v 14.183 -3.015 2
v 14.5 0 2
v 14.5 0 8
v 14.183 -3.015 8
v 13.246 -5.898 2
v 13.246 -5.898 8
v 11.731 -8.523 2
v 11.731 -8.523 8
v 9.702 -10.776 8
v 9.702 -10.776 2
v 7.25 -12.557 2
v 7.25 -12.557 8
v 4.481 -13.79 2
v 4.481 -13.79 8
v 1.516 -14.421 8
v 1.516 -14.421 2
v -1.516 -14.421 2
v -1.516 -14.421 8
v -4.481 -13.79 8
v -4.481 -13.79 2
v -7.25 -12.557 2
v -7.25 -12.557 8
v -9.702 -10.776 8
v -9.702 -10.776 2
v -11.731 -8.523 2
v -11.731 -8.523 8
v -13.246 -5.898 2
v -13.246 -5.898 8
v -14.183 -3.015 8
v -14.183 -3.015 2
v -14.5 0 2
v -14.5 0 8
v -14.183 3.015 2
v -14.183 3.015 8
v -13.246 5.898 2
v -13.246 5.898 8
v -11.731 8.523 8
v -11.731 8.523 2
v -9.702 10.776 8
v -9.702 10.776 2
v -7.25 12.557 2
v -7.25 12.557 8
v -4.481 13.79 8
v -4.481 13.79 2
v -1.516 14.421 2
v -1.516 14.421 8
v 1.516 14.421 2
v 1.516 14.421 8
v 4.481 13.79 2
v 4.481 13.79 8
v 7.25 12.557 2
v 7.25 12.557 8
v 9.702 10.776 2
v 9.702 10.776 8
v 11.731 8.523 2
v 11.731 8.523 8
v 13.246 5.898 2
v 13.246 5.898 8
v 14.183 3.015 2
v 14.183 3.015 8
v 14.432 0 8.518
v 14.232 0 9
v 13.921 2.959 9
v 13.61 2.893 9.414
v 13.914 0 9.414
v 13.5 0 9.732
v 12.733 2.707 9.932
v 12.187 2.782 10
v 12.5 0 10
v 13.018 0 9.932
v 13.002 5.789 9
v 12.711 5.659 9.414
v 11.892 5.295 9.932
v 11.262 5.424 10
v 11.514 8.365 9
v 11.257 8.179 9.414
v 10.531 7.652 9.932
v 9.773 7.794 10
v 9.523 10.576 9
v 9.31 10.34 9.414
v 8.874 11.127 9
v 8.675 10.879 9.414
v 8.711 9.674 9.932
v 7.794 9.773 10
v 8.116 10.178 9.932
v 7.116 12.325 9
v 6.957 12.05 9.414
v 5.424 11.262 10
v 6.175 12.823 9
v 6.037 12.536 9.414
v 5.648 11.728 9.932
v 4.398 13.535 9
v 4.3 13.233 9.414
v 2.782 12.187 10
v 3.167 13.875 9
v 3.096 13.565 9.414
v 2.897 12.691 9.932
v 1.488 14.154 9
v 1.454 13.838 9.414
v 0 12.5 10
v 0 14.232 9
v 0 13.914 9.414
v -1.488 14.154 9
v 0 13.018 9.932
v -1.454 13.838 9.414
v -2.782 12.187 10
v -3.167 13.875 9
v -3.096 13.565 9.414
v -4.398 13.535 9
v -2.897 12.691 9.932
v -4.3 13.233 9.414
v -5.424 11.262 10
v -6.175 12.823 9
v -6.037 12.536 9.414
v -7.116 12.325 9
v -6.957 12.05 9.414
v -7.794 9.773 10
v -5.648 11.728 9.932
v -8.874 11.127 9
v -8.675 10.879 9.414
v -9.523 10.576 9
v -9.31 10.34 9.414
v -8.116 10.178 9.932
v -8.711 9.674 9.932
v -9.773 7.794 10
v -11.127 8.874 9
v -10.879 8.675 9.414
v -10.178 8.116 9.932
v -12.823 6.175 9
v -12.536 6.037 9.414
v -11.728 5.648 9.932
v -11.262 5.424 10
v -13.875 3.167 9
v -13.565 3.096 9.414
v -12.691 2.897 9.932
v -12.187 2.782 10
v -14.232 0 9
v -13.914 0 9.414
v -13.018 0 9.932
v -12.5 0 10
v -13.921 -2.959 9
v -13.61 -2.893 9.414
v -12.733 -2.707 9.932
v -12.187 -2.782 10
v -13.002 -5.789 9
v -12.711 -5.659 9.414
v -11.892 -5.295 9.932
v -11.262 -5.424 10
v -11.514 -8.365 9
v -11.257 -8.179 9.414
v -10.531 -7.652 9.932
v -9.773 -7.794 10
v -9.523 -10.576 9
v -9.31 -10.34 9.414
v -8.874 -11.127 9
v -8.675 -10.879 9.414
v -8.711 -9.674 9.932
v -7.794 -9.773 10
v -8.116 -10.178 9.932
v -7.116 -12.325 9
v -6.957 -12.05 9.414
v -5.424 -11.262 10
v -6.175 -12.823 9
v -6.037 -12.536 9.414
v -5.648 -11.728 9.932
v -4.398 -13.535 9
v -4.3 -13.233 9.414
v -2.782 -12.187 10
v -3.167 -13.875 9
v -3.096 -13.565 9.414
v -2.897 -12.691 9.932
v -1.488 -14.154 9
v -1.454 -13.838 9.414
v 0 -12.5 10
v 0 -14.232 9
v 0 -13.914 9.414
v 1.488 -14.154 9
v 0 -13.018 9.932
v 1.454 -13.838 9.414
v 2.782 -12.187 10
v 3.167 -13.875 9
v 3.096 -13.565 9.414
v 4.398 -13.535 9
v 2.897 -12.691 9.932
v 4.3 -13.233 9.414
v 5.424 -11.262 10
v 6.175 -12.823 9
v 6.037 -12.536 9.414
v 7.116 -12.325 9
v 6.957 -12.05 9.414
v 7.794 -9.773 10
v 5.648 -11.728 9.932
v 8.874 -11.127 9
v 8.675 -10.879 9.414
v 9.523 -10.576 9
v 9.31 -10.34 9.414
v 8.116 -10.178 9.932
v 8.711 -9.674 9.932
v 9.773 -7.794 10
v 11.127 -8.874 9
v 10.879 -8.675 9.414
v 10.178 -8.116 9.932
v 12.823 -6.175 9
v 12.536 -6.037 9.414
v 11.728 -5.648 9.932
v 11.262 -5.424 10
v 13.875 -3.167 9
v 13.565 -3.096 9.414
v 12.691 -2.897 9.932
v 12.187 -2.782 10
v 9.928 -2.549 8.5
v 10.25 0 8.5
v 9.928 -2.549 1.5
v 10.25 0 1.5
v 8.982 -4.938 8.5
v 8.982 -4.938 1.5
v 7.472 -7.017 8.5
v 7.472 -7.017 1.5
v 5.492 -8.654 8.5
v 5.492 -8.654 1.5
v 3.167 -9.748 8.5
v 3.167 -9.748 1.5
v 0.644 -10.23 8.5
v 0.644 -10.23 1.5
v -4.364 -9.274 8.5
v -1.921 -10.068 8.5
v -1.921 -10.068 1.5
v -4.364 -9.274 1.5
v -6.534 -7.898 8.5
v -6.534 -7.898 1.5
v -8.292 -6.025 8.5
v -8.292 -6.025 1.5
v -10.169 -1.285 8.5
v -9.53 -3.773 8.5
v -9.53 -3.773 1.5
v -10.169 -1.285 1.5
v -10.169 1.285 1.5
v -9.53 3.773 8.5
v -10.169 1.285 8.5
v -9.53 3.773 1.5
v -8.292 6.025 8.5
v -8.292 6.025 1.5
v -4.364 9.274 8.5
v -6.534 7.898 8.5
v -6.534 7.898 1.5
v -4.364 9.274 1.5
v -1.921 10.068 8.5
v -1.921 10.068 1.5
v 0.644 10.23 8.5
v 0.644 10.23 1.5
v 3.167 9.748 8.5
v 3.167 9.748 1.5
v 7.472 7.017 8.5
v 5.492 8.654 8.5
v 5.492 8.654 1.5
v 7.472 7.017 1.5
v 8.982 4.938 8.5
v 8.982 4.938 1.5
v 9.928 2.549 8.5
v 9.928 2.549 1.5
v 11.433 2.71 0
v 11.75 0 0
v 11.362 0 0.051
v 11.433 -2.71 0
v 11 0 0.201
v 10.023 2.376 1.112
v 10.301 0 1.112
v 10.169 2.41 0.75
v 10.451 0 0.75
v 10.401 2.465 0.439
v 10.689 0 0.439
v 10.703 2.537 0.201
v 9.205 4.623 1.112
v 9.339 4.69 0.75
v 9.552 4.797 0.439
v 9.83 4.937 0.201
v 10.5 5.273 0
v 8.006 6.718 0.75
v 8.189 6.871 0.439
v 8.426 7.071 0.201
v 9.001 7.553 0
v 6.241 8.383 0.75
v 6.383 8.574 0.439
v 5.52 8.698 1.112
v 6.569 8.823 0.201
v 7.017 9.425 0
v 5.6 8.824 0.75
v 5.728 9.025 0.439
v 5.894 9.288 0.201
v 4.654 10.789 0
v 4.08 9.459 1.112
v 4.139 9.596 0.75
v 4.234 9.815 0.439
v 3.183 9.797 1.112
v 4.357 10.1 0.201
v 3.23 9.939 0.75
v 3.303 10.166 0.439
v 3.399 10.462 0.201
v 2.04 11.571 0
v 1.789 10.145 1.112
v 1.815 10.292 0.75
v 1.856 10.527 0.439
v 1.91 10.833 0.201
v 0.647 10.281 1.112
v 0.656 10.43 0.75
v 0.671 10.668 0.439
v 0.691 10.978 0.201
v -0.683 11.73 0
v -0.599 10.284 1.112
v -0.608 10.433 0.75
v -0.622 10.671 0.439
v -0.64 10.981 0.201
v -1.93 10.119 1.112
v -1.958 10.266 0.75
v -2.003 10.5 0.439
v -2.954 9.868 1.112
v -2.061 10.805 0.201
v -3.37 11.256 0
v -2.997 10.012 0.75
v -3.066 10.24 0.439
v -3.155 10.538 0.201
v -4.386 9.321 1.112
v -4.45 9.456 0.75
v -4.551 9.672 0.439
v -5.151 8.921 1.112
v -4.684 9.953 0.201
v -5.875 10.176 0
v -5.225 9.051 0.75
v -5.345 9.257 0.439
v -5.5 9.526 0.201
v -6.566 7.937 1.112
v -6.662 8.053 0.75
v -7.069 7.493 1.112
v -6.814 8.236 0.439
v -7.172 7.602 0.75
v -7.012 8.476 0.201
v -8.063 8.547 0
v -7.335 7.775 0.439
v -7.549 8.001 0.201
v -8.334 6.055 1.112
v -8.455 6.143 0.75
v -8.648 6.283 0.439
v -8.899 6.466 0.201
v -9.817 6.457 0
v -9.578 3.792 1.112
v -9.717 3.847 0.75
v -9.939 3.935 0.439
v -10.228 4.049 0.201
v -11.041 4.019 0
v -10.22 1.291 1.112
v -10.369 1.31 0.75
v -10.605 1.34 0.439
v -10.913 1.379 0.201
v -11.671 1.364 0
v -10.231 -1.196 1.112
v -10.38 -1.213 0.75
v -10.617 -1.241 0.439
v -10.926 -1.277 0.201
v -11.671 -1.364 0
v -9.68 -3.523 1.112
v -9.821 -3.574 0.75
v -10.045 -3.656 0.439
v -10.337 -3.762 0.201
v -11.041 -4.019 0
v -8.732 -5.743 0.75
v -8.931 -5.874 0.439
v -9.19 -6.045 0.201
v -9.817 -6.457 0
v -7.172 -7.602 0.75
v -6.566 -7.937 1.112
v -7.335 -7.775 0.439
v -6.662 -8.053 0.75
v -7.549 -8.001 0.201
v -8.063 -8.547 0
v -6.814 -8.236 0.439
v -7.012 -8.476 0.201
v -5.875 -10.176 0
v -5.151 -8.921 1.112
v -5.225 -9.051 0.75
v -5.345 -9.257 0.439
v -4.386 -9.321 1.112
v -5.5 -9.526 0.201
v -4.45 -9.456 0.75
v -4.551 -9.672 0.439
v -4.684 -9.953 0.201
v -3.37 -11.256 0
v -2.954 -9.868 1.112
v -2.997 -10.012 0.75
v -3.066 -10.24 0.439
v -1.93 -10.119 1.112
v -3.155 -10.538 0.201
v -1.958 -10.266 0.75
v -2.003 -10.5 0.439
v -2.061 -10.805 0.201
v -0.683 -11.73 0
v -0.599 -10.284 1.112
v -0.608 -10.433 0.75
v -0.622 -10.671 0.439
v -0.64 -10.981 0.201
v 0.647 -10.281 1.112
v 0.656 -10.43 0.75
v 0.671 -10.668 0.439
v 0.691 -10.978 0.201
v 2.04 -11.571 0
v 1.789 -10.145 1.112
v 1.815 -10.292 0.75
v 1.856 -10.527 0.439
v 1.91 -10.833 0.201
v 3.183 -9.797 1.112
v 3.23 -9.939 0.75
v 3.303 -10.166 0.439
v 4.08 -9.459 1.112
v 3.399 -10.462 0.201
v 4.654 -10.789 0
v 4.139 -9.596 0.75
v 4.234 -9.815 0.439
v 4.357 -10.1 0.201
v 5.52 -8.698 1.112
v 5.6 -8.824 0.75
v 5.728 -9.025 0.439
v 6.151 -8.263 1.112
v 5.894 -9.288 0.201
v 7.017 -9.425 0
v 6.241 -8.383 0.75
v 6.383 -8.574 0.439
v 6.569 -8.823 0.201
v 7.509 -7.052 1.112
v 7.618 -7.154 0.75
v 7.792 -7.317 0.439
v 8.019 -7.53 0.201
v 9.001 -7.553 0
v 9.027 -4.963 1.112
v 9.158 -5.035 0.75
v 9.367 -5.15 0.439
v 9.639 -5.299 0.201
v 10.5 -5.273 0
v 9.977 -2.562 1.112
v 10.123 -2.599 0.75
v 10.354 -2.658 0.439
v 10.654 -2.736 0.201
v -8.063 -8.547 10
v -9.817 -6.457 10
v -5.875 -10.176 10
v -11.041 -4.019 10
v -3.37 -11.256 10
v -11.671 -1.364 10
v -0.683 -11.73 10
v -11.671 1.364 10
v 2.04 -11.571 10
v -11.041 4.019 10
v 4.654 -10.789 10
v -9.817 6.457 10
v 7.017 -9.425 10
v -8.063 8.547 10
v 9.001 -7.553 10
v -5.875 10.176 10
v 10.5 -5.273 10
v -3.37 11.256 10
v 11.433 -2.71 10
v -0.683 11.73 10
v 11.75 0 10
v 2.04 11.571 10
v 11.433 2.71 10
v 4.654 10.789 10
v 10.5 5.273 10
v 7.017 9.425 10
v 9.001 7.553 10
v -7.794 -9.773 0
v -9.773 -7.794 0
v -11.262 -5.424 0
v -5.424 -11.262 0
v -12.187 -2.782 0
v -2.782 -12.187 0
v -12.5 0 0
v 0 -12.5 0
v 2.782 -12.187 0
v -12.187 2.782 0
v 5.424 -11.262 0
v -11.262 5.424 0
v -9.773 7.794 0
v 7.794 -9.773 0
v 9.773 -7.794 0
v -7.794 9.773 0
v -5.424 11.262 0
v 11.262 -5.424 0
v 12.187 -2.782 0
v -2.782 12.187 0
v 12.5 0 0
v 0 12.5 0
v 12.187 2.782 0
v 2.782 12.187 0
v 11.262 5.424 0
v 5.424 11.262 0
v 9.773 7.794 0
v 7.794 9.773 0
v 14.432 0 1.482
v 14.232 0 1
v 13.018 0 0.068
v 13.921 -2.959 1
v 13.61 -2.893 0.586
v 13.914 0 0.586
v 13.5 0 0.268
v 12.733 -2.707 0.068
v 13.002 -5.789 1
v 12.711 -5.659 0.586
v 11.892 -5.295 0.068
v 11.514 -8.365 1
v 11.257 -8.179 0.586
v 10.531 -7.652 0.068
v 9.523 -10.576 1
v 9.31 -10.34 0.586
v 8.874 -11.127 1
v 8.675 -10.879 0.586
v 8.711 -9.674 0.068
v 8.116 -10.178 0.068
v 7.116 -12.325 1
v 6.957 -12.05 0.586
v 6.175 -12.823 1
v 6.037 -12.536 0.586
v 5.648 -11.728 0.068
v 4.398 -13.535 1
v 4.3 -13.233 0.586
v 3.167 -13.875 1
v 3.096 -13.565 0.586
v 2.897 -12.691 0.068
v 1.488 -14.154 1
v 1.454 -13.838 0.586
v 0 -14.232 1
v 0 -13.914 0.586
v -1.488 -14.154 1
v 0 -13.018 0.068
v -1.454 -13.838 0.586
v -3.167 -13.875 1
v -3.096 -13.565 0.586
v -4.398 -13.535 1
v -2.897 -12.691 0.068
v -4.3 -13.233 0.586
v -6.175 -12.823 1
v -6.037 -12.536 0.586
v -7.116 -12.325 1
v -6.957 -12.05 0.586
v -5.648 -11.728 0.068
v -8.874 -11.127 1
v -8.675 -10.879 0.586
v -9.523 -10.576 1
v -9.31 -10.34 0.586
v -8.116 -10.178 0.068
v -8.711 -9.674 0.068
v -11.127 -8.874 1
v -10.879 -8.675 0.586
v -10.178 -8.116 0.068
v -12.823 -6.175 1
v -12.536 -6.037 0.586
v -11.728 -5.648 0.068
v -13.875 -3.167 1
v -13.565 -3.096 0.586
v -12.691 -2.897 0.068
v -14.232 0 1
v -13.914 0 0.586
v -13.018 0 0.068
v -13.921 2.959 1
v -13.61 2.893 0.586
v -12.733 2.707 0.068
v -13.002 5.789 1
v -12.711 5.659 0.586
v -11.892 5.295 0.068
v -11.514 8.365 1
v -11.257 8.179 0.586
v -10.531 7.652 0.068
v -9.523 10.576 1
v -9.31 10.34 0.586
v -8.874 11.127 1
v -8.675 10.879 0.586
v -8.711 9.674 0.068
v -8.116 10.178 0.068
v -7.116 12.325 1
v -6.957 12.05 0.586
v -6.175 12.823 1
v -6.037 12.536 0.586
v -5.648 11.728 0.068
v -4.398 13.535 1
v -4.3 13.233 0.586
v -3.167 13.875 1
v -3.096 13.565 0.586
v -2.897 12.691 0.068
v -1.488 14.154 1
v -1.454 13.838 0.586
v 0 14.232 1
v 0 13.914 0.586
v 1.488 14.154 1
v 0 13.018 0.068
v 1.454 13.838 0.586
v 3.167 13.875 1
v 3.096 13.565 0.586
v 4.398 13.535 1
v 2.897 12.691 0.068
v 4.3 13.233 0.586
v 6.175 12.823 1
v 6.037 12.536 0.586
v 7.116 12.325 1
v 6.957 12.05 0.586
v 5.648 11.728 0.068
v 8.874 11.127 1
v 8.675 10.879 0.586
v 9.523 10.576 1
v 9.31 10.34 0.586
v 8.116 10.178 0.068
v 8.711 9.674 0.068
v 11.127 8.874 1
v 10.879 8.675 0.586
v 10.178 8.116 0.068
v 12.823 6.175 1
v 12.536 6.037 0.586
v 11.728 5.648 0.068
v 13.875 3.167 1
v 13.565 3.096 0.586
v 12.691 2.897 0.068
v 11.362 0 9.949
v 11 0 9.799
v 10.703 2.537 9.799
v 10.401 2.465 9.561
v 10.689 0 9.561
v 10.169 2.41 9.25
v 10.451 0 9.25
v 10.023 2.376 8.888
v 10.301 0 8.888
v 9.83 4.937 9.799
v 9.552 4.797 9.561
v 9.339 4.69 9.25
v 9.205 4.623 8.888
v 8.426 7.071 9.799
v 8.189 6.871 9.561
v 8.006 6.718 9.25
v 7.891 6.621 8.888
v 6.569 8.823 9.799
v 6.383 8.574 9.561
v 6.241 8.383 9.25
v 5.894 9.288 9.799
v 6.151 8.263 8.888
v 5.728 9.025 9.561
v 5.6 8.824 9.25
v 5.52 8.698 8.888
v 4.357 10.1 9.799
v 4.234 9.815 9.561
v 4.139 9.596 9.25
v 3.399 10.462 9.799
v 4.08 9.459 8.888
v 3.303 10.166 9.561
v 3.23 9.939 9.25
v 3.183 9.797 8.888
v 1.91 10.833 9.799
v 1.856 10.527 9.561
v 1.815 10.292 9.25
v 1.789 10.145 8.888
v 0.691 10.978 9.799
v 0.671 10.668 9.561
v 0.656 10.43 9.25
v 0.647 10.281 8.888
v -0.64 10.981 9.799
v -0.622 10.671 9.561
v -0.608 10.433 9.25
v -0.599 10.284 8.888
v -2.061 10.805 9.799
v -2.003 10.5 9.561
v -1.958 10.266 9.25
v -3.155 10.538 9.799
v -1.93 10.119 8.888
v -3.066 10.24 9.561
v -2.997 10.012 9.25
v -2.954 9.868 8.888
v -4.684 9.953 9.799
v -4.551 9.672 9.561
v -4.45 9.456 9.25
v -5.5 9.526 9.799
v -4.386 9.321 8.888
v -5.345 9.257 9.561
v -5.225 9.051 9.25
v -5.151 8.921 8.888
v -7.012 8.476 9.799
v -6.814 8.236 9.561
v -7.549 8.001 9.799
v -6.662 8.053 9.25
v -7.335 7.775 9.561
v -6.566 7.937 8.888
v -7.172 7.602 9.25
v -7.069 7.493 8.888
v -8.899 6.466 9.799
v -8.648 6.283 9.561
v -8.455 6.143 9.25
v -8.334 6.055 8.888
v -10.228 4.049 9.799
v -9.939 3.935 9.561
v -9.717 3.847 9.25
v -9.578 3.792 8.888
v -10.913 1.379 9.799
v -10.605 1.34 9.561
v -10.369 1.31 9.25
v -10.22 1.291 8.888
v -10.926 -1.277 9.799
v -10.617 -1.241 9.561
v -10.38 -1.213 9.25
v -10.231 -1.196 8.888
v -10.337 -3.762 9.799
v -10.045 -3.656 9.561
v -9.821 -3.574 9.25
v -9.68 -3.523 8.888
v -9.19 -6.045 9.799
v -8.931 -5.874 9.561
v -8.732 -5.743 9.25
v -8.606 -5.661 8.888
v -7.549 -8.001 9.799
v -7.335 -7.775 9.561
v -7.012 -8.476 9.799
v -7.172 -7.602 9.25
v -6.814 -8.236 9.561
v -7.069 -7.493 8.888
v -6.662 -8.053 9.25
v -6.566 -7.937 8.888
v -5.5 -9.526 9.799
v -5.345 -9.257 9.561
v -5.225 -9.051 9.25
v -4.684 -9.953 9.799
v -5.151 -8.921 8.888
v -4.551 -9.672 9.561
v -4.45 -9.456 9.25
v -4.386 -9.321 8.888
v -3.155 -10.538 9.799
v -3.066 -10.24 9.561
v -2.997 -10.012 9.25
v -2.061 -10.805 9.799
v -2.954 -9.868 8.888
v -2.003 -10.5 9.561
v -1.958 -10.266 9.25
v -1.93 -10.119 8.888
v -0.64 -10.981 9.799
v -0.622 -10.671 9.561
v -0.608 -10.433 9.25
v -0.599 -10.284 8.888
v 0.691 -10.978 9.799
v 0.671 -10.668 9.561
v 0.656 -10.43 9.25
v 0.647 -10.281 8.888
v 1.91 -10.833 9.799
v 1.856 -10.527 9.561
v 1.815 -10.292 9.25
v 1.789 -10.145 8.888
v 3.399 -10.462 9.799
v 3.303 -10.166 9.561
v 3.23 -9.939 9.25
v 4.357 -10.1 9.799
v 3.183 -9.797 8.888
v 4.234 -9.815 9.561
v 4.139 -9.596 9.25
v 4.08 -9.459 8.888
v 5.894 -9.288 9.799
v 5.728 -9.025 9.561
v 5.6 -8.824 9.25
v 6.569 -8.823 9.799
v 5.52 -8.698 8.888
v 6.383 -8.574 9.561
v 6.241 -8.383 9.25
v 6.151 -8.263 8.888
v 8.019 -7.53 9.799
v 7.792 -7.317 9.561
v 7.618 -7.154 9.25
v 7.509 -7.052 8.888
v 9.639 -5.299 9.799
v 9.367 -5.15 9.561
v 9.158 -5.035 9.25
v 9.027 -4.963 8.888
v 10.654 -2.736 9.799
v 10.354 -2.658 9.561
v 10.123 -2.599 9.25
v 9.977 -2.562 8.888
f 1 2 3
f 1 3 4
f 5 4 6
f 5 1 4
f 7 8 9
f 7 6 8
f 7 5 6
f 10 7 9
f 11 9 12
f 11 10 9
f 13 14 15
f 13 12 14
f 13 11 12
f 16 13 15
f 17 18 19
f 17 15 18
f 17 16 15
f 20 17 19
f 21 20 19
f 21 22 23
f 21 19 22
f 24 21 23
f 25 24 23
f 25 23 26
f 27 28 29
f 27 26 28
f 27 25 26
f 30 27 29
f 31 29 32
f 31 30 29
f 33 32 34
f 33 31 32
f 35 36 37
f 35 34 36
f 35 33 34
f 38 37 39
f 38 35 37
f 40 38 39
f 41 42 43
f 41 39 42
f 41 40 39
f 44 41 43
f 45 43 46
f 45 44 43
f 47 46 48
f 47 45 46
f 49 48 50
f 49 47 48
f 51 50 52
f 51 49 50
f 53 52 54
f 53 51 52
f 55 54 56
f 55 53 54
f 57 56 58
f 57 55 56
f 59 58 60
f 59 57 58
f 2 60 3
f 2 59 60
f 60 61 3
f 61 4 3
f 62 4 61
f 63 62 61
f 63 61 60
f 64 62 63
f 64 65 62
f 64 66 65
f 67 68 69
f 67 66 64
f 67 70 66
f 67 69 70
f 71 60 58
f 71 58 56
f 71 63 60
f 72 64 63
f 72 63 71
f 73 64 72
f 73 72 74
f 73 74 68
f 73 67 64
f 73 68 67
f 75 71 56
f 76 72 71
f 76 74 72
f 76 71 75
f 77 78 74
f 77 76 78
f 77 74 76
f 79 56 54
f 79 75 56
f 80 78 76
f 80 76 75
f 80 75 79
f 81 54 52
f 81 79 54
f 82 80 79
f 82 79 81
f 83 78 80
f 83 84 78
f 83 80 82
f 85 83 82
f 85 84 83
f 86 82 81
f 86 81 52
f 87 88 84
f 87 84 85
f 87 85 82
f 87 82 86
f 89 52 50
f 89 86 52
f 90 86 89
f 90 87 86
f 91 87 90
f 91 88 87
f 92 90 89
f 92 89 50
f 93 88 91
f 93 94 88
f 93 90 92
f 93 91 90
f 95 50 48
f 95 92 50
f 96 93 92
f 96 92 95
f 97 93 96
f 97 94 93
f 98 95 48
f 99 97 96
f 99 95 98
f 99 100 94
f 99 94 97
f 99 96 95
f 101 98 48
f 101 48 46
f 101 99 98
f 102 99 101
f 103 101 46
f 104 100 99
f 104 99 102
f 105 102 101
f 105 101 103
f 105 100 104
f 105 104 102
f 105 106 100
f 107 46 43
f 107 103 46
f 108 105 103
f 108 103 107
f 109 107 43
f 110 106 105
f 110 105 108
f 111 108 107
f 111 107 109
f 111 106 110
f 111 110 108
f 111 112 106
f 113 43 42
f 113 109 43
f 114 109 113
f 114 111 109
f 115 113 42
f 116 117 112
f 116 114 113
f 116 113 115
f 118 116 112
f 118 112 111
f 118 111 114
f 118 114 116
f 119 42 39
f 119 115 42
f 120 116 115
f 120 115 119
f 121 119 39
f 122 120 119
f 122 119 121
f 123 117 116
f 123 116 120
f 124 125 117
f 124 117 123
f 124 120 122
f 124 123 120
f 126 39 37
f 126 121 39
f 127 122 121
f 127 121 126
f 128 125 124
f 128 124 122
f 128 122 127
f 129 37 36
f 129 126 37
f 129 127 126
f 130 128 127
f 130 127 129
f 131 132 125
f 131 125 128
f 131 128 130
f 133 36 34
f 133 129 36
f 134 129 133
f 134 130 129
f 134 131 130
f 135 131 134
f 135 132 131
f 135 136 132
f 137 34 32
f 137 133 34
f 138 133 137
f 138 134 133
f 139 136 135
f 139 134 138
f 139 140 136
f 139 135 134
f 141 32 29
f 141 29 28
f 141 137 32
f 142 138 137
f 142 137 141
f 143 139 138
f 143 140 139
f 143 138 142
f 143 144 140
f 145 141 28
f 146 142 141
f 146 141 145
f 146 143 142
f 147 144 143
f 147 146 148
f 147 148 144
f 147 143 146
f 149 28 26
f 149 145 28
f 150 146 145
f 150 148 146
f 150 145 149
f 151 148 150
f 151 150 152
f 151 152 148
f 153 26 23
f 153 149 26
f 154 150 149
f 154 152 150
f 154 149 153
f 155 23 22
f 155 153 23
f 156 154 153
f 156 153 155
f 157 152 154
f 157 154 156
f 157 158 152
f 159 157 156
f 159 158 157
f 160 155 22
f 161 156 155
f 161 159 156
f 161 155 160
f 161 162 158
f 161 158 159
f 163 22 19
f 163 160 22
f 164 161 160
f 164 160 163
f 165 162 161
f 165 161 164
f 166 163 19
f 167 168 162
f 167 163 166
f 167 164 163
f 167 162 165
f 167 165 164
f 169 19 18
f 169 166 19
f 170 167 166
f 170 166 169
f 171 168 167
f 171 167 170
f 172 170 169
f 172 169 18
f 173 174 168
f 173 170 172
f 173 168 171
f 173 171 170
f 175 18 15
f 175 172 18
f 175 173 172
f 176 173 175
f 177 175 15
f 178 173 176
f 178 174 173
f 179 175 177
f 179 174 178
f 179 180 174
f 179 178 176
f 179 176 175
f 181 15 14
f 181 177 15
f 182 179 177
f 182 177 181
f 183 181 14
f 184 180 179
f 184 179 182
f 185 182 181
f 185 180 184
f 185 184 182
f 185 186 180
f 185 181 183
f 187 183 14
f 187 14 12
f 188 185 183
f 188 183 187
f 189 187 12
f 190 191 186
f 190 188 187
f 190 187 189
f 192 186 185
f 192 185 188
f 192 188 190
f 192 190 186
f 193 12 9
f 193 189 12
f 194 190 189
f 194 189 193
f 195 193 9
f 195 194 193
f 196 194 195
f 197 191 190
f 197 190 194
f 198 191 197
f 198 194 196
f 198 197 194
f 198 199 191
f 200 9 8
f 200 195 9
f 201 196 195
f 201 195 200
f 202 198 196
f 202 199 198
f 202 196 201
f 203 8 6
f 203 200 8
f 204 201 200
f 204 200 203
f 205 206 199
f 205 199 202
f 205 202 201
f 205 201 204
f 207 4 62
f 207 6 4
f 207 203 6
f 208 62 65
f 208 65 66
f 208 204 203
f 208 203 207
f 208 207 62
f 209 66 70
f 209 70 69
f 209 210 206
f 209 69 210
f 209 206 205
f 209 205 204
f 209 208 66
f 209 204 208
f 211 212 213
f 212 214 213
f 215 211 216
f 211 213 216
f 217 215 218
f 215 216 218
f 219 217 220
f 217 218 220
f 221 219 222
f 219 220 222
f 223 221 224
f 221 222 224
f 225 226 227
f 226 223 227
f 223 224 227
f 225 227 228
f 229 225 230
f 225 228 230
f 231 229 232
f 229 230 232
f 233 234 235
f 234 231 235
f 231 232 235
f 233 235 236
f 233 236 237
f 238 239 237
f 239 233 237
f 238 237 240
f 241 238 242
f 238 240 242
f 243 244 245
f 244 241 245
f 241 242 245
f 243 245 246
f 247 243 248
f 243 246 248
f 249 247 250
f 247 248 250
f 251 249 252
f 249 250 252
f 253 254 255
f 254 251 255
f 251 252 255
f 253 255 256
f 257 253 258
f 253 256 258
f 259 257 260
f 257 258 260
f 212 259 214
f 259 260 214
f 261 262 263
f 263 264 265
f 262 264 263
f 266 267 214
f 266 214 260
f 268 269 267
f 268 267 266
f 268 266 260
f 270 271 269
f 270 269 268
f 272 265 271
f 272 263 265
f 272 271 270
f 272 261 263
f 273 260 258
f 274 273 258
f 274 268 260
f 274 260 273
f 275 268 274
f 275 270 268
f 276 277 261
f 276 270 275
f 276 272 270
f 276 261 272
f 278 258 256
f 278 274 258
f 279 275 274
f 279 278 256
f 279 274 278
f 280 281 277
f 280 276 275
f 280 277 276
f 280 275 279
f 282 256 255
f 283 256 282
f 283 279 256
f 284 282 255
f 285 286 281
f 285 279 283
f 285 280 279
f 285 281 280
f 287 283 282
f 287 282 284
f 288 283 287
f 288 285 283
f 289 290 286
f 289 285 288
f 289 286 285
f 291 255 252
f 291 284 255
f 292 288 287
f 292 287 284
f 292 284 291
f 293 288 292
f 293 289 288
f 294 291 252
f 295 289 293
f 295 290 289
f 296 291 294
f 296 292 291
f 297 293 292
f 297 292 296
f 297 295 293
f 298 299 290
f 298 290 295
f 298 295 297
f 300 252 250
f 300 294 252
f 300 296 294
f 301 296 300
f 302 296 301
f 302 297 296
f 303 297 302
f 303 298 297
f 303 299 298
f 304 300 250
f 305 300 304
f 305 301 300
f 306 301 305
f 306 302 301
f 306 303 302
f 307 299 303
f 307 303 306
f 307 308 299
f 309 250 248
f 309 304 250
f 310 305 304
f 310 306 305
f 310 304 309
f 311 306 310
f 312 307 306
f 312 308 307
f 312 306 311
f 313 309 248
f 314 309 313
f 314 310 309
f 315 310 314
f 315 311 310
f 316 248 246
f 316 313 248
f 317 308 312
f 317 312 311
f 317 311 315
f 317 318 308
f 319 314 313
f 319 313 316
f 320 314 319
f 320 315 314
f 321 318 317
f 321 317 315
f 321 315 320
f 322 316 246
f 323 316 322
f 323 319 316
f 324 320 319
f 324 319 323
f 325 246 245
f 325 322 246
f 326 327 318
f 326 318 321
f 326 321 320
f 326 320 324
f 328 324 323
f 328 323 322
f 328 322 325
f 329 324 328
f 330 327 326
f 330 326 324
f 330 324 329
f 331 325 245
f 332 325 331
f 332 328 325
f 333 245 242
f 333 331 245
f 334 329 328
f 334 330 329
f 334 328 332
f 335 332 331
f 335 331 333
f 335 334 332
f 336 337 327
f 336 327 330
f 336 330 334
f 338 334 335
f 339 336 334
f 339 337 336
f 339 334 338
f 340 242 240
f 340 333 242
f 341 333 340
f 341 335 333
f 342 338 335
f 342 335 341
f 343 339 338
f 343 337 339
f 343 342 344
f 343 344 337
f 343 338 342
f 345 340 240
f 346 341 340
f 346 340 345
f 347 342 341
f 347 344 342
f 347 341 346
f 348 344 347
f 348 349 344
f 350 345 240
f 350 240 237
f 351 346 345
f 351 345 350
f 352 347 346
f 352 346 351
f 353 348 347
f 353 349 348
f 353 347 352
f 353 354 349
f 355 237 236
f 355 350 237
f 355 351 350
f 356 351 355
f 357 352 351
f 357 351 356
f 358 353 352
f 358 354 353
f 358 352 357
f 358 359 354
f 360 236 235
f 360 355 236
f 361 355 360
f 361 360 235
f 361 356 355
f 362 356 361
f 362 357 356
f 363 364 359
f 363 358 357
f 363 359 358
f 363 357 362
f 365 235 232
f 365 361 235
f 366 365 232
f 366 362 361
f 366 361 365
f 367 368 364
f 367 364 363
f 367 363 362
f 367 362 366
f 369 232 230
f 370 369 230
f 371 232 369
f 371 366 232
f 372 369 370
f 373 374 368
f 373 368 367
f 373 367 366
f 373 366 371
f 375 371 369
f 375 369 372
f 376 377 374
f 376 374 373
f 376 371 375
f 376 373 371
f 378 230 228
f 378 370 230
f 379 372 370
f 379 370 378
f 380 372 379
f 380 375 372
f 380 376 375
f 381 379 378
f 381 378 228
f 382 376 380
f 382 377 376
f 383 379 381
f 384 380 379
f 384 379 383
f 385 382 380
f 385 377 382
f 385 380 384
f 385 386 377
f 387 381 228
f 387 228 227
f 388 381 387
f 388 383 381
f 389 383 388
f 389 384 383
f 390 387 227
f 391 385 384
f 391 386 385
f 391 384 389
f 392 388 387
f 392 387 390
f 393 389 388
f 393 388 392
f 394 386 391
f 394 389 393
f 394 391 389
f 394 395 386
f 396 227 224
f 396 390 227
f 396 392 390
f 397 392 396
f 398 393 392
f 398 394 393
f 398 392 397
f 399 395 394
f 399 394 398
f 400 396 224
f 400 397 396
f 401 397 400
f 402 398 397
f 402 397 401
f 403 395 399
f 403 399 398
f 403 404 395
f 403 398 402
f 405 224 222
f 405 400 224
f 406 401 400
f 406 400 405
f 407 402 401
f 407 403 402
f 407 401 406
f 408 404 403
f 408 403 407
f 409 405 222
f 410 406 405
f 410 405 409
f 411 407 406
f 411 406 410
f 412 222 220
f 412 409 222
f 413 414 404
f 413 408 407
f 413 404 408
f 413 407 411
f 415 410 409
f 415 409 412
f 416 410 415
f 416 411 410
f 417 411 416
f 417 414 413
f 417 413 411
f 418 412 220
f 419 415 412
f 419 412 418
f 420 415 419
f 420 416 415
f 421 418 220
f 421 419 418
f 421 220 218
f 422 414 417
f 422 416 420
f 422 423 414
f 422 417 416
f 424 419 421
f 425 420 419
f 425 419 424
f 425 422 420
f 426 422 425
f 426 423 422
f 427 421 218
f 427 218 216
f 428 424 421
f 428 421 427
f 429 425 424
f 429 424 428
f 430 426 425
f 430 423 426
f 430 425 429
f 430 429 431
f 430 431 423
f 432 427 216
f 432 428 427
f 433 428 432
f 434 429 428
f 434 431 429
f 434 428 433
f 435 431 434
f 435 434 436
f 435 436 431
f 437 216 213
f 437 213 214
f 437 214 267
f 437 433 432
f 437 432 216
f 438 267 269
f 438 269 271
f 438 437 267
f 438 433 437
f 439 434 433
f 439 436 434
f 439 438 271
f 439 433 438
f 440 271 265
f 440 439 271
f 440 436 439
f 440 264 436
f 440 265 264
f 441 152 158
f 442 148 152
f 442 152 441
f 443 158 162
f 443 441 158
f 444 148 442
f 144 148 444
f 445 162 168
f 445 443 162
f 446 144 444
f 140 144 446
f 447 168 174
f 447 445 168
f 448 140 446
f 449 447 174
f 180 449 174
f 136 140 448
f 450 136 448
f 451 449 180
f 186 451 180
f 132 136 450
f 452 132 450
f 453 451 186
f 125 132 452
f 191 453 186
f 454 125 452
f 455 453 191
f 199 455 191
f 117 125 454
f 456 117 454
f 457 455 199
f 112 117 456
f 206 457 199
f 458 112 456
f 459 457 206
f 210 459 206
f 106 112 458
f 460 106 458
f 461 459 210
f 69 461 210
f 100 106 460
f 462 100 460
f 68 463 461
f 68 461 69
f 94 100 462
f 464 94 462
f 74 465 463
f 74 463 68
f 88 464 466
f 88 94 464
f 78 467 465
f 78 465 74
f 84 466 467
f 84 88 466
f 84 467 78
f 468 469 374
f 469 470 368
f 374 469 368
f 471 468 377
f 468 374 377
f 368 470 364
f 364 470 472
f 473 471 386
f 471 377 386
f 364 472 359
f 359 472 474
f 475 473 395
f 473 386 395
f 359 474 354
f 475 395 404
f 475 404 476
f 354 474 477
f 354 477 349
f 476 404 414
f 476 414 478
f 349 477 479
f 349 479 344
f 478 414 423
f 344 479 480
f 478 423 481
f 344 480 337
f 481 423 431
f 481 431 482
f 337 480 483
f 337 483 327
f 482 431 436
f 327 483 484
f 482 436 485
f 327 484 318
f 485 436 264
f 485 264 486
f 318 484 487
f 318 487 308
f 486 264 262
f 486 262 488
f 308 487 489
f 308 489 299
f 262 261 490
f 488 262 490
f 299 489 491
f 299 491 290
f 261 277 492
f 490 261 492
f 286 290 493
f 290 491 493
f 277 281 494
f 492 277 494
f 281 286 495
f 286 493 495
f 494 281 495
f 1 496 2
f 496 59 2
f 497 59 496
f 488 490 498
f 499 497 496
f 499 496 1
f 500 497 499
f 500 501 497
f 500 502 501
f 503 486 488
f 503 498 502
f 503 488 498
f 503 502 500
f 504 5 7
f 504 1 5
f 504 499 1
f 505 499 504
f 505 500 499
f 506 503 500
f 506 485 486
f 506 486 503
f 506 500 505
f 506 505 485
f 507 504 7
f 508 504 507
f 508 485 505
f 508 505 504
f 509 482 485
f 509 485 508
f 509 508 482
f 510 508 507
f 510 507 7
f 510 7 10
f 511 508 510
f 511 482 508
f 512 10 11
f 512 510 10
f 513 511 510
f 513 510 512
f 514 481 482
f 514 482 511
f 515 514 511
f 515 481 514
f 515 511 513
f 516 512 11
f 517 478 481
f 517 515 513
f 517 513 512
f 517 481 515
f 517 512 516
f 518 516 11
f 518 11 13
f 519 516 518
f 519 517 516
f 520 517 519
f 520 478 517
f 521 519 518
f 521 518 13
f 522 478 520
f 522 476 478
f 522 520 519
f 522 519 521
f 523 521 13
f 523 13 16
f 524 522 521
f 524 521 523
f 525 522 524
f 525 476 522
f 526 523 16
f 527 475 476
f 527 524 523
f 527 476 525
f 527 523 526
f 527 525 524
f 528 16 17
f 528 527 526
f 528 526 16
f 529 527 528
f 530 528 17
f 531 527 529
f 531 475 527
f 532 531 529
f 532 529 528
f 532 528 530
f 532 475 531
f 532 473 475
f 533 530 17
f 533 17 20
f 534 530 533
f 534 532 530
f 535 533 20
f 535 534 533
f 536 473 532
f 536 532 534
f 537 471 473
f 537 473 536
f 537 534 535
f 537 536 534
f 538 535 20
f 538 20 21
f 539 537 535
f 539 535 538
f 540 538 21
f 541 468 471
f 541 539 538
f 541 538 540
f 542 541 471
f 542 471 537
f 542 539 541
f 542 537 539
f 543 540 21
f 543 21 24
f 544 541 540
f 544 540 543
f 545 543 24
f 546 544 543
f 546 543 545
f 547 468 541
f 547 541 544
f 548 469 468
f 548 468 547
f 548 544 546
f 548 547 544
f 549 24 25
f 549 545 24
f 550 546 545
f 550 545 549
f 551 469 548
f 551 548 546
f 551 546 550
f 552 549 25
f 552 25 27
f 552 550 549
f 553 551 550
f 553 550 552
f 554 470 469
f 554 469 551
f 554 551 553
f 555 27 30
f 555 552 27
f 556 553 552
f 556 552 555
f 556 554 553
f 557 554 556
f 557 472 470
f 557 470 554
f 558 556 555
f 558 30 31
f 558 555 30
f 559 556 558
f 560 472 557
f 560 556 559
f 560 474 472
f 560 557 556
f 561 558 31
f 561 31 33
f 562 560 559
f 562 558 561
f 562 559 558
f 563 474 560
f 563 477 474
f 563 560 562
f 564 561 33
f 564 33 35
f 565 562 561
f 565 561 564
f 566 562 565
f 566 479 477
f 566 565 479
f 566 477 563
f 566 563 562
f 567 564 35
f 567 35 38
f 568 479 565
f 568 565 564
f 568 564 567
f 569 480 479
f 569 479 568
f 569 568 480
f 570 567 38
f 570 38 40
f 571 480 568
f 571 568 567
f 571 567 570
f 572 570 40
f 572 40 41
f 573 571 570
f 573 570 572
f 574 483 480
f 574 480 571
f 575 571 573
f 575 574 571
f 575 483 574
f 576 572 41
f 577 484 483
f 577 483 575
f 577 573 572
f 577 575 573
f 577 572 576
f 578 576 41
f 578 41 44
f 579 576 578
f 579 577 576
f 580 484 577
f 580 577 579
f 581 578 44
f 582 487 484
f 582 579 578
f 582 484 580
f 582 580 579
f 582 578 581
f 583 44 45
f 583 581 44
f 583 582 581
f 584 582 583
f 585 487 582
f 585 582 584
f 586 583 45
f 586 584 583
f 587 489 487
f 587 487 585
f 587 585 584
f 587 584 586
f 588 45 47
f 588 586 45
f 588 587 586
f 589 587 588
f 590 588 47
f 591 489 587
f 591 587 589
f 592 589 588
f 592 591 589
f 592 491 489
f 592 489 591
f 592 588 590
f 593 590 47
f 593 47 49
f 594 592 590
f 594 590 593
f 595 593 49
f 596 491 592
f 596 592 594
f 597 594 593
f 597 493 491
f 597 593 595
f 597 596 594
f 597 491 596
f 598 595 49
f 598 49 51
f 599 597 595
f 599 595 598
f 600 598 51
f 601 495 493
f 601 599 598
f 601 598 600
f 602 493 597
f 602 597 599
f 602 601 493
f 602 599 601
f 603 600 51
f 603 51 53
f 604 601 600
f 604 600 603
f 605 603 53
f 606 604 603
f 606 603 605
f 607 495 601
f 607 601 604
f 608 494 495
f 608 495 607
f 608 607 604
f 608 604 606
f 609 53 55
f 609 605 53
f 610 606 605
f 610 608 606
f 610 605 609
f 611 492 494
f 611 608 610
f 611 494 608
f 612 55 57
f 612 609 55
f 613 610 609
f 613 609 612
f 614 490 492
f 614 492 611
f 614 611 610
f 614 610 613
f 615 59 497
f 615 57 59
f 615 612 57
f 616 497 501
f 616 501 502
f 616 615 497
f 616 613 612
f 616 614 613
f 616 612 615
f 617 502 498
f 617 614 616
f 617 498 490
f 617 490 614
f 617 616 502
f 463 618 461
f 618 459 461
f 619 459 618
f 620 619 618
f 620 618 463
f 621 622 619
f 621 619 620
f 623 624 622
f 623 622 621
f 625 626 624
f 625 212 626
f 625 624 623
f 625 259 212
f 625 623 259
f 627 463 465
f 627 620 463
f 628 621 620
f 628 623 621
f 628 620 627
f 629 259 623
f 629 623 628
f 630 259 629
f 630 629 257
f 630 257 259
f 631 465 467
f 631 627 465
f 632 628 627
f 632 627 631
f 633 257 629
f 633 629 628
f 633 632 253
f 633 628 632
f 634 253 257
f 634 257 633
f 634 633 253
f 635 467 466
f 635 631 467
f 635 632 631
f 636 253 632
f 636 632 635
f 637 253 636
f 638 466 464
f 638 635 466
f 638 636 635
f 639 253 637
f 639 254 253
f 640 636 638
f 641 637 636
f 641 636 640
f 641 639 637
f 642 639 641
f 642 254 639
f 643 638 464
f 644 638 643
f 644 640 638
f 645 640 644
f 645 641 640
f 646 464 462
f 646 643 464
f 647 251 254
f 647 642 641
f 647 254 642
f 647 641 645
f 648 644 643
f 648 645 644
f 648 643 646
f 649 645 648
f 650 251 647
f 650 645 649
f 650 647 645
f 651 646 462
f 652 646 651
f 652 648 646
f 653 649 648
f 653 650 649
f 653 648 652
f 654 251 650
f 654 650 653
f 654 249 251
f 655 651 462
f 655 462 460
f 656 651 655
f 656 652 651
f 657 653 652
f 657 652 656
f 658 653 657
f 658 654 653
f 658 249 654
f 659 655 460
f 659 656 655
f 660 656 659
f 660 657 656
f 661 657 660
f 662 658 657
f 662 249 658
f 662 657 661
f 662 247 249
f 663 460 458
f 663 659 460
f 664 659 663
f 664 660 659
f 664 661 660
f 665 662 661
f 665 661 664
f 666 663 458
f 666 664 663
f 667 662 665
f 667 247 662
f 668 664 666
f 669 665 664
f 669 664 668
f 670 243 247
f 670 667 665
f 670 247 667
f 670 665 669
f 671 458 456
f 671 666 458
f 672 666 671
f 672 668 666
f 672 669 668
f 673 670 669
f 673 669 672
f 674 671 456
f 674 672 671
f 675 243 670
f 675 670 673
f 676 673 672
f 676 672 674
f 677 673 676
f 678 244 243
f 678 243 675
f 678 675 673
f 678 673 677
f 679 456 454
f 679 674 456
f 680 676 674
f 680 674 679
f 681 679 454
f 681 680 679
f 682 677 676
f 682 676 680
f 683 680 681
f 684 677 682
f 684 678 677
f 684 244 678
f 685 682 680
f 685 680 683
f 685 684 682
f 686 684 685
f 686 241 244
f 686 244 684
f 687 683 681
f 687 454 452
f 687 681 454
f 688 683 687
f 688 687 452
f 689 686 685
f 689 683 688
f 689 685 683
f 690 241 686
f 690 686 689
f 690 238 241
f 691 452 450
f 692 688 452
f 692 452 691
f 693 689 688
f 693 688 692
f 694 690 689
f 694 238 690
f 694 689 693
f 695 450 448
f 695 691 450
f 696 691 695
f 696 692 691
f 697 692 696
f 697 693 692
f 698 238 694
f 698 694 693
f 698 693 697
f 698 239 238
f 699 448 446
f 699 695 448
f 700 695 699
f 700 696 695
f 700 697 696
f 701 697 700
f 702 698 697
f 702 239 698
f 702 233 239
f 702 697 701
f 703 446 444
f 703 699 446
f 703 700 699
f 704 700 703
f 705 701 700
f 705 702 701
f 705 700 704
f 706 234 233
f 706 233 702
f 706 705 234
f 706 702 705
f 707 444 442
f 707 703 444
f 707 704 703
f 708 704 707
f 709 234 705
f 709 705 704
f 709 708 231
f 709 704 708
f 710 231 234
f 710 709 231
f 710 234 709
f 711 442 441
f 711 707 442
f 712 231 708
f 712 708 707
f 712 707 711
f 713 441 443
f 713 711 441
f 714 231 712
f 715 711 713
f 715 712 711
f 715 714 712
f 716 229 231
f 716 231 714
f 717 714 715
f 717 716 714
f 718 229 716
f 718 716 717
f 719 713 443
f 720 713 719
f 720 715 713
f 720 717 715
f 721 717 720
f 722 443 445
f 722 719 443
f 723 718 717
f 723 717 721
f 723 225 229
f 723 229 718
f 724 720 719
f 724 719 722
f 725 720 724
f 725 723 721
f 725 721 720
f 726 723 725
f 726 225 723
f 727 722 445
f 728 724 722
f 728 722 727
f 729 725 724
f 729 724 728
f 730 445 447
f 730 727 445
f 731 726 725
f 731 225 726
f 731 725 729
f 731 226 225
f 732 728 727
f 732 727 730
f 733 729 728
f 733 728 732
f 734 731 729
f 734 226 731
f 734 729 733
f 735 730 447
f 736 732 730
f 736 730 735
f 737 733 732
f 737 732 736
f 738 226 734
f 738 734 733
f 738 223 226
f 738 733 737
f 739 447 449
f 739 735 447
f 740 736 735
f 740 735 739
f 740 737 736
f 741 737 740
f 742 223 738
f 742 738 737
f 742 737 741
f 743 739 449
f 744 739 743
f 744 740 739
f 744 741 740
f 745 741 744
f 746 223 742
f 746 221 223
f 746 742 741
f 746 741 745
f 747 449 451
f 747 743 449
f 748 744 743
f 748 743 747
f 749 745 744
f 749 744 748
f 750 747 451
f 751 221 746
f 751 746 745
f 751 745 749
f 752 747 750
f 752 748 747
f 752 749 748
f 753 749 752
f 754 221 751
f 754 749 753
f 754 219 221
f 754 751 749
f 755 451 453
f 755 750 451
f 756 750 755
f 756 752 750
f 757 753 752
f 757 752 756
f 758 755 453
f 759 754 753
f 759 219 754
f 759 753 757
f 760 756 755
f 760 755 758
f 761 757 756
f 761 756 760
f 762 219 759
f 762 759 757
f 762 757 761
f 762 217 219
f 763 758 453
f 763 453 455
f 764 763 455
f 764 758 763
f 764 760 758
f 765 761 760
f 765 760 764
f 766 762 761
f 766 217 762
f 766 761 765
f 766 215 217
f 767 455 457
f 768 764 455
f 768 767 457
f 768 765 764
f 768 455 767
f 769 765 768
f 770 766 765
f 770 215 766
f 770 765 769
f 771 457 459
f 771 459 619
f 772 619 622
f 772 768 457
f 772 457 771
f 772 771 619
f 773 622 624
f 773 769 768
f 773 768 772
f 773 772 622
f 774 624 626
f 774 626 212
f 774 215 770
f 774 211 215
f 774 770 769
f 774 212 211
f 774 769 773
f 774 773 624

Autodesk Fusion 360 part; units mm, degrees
sketch "Esboço1" plane through (0, 0, 0) normal (0, 0, 1) x (1, 0, 0)
  circle A0 centre (0, 0) radius 10.25
  circle A1 centre (0, 0) radius 14.5
  dimension "d1" = 20.5
  dimension "d2" = 4.25
extrude "Extrusão1" add sketch "Esboço1" along normal blind 10
fillet "Arredondamento1" radius 2 1 edges at (-13.5187, -5.2434, 10)
fillet "Arredondamento2" radius 2 1 edges at (-13.5187, -5.2434, 0)
fillet "Arredondamento3" radius 1.5 1 edges at (-9.5564, 3.7066, 10)
fillet "Arredondamento4" radius 1.5 1 edges at (-9.5564, 3.7066, 0)
